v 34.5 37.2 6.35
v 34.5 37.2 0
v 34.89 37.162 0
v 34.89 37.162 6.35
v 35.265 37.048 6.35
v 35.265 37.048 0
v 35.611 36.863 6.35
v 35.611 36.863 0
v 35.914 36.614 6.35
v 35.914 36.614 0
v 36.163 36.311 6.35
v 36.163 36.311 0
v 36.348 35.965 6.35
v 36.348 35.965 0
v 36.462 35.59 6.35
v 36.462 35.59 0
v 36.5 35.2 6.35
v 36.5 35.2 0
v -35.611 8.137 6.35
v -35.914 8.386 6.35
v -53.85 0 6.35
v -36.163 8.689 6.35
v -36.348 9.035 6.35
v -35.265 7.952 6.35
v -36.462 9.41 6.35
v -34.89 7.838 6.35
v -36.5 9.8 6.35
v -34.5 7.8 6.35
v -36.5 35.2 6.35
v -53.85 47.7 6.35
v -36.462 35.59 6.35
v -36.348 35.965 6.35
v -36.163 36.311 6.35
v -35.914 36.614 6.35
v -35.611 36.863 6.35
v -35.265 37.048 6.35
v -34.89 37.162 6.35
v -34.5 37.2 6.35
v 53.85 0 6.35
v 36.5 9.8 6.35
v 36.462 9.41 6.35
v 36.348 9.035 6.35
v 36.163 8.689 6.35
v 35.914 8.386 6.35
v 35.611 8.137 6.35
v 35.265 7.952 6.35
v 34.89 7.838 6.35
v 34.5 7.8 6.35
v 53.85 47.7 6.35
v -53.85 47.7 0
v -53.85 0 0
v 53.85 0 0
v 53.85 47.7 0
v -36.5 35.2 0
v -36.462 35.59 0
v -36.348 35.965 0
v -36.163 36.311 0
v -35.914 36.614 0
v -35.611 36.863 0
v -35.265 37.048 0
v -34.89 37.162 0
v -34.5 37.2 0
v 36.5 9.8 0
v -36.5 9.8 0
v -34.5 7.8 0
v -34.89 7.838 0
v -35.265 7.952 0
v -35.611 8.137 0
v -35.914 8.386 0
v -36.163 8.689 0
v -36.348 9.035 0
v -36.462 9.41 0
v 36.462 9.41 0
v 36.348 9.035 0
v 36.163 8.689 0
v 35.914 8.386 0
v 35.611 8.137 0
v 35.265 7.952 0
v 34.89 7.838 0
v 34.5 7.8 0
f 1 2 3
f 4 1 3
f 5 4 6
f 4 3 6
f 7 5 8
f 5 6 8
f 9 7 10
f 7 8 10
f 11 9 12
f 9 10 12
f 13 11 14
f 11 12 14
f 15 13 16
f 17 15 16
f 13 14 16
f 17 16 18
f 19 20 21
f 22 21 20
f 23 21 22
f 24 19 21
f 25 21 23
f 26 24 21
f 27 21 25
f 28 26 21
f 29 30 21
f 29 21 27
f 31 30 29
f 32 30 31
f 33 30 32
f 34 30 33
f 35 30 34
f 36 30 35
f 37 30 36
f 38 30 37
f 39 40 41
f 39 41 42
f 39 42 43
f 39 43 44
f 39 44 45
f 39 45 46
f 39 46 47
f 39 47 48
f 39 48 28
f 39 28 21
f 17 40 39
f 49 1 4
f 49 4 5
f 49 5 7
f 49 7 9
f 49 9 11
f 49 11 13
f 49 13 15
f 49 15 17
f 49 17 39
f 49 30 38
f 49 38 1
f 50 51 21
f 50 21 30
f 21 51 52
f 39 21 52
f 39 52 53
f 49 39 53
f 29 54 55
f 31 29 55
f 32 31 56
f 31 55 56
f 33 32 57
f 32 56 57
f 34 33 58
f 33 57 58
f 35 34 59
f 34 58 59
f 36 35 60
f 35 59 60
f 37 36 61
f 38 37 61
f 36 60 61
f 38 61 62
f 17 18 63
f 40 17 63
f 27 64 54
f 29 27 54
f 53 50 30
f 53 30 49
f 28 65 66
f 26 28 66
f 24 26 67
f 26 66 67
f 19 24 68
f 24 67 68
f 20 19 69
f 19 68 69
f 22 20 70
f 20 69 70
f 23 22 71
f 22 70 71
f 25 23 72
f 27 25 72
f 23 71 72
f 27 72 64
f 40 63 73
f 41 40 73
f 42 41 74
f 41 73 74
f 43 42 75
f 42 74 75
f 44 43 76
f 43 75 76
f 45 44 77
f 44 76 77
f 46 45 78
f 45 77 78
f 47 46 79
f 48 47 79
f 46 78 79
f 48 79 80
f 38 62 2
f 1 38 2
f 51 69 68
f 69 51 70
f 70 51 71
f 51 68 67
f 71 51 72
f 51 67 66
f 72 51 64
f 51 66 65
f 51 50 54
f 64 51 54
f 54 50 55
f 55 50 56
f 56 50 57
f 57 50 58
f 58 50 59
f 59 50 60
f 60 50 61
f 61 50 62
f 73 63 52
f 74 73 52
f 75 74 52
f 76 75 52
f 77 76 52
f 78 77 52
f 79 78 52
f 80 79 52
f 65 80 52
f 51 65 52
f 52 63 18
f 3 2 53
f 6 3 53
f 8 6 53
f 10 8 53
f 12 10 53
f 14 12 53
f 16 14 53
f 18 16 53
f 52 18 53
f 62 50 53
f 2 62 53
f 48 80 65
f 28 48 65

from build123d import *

# Parameters (mm, degrees)
SKETCH1_W           = 107.7
SKETCH1_H           = 47.7
BOSS_EXTRUDE1_DEPTH = 6.35


with BuildPart() as part:
    # Sketch1 → Boss-Extrude1 (new body)
    with BuildSketch(Plane.XY):
        with Locations((0, 23.85)):
            Rectangle(SKETCH1_W, SKETCH1_H)
        with BuildLine():
            Line((34.500012, 7.8), (-34.499988, 7.8))
            ThreePointArc((-34.499988, 7.8), (-35.914201562, 8.385786438), (-36.499988, 9.8))
            Line((-36.499988, 9.8), (-36.499988, 35.2))
            ThreePointArc((-36.499988, 35.2), (-35.914201562, 36.614213562), (-34.499988, 37.2))
            Line((-34.499988, 37.2), (34.500012, 37.2))
            ThreePointArc((34.500012, 37.2), (35.914225562, 36.614213562), (36.500012, 35.2))
            Line((36.500012, 35.2), (36.500012, 9.8))
            ThreePointArc((36.500012, 9.8), (35.914225562, 8.385786438), (34.500012, 7.8))
        make_face(mode=Mode.SUBTRACT)
    extrude(amount=BOSS_EXTRUDE1_DEPTH)


solid = part.part
